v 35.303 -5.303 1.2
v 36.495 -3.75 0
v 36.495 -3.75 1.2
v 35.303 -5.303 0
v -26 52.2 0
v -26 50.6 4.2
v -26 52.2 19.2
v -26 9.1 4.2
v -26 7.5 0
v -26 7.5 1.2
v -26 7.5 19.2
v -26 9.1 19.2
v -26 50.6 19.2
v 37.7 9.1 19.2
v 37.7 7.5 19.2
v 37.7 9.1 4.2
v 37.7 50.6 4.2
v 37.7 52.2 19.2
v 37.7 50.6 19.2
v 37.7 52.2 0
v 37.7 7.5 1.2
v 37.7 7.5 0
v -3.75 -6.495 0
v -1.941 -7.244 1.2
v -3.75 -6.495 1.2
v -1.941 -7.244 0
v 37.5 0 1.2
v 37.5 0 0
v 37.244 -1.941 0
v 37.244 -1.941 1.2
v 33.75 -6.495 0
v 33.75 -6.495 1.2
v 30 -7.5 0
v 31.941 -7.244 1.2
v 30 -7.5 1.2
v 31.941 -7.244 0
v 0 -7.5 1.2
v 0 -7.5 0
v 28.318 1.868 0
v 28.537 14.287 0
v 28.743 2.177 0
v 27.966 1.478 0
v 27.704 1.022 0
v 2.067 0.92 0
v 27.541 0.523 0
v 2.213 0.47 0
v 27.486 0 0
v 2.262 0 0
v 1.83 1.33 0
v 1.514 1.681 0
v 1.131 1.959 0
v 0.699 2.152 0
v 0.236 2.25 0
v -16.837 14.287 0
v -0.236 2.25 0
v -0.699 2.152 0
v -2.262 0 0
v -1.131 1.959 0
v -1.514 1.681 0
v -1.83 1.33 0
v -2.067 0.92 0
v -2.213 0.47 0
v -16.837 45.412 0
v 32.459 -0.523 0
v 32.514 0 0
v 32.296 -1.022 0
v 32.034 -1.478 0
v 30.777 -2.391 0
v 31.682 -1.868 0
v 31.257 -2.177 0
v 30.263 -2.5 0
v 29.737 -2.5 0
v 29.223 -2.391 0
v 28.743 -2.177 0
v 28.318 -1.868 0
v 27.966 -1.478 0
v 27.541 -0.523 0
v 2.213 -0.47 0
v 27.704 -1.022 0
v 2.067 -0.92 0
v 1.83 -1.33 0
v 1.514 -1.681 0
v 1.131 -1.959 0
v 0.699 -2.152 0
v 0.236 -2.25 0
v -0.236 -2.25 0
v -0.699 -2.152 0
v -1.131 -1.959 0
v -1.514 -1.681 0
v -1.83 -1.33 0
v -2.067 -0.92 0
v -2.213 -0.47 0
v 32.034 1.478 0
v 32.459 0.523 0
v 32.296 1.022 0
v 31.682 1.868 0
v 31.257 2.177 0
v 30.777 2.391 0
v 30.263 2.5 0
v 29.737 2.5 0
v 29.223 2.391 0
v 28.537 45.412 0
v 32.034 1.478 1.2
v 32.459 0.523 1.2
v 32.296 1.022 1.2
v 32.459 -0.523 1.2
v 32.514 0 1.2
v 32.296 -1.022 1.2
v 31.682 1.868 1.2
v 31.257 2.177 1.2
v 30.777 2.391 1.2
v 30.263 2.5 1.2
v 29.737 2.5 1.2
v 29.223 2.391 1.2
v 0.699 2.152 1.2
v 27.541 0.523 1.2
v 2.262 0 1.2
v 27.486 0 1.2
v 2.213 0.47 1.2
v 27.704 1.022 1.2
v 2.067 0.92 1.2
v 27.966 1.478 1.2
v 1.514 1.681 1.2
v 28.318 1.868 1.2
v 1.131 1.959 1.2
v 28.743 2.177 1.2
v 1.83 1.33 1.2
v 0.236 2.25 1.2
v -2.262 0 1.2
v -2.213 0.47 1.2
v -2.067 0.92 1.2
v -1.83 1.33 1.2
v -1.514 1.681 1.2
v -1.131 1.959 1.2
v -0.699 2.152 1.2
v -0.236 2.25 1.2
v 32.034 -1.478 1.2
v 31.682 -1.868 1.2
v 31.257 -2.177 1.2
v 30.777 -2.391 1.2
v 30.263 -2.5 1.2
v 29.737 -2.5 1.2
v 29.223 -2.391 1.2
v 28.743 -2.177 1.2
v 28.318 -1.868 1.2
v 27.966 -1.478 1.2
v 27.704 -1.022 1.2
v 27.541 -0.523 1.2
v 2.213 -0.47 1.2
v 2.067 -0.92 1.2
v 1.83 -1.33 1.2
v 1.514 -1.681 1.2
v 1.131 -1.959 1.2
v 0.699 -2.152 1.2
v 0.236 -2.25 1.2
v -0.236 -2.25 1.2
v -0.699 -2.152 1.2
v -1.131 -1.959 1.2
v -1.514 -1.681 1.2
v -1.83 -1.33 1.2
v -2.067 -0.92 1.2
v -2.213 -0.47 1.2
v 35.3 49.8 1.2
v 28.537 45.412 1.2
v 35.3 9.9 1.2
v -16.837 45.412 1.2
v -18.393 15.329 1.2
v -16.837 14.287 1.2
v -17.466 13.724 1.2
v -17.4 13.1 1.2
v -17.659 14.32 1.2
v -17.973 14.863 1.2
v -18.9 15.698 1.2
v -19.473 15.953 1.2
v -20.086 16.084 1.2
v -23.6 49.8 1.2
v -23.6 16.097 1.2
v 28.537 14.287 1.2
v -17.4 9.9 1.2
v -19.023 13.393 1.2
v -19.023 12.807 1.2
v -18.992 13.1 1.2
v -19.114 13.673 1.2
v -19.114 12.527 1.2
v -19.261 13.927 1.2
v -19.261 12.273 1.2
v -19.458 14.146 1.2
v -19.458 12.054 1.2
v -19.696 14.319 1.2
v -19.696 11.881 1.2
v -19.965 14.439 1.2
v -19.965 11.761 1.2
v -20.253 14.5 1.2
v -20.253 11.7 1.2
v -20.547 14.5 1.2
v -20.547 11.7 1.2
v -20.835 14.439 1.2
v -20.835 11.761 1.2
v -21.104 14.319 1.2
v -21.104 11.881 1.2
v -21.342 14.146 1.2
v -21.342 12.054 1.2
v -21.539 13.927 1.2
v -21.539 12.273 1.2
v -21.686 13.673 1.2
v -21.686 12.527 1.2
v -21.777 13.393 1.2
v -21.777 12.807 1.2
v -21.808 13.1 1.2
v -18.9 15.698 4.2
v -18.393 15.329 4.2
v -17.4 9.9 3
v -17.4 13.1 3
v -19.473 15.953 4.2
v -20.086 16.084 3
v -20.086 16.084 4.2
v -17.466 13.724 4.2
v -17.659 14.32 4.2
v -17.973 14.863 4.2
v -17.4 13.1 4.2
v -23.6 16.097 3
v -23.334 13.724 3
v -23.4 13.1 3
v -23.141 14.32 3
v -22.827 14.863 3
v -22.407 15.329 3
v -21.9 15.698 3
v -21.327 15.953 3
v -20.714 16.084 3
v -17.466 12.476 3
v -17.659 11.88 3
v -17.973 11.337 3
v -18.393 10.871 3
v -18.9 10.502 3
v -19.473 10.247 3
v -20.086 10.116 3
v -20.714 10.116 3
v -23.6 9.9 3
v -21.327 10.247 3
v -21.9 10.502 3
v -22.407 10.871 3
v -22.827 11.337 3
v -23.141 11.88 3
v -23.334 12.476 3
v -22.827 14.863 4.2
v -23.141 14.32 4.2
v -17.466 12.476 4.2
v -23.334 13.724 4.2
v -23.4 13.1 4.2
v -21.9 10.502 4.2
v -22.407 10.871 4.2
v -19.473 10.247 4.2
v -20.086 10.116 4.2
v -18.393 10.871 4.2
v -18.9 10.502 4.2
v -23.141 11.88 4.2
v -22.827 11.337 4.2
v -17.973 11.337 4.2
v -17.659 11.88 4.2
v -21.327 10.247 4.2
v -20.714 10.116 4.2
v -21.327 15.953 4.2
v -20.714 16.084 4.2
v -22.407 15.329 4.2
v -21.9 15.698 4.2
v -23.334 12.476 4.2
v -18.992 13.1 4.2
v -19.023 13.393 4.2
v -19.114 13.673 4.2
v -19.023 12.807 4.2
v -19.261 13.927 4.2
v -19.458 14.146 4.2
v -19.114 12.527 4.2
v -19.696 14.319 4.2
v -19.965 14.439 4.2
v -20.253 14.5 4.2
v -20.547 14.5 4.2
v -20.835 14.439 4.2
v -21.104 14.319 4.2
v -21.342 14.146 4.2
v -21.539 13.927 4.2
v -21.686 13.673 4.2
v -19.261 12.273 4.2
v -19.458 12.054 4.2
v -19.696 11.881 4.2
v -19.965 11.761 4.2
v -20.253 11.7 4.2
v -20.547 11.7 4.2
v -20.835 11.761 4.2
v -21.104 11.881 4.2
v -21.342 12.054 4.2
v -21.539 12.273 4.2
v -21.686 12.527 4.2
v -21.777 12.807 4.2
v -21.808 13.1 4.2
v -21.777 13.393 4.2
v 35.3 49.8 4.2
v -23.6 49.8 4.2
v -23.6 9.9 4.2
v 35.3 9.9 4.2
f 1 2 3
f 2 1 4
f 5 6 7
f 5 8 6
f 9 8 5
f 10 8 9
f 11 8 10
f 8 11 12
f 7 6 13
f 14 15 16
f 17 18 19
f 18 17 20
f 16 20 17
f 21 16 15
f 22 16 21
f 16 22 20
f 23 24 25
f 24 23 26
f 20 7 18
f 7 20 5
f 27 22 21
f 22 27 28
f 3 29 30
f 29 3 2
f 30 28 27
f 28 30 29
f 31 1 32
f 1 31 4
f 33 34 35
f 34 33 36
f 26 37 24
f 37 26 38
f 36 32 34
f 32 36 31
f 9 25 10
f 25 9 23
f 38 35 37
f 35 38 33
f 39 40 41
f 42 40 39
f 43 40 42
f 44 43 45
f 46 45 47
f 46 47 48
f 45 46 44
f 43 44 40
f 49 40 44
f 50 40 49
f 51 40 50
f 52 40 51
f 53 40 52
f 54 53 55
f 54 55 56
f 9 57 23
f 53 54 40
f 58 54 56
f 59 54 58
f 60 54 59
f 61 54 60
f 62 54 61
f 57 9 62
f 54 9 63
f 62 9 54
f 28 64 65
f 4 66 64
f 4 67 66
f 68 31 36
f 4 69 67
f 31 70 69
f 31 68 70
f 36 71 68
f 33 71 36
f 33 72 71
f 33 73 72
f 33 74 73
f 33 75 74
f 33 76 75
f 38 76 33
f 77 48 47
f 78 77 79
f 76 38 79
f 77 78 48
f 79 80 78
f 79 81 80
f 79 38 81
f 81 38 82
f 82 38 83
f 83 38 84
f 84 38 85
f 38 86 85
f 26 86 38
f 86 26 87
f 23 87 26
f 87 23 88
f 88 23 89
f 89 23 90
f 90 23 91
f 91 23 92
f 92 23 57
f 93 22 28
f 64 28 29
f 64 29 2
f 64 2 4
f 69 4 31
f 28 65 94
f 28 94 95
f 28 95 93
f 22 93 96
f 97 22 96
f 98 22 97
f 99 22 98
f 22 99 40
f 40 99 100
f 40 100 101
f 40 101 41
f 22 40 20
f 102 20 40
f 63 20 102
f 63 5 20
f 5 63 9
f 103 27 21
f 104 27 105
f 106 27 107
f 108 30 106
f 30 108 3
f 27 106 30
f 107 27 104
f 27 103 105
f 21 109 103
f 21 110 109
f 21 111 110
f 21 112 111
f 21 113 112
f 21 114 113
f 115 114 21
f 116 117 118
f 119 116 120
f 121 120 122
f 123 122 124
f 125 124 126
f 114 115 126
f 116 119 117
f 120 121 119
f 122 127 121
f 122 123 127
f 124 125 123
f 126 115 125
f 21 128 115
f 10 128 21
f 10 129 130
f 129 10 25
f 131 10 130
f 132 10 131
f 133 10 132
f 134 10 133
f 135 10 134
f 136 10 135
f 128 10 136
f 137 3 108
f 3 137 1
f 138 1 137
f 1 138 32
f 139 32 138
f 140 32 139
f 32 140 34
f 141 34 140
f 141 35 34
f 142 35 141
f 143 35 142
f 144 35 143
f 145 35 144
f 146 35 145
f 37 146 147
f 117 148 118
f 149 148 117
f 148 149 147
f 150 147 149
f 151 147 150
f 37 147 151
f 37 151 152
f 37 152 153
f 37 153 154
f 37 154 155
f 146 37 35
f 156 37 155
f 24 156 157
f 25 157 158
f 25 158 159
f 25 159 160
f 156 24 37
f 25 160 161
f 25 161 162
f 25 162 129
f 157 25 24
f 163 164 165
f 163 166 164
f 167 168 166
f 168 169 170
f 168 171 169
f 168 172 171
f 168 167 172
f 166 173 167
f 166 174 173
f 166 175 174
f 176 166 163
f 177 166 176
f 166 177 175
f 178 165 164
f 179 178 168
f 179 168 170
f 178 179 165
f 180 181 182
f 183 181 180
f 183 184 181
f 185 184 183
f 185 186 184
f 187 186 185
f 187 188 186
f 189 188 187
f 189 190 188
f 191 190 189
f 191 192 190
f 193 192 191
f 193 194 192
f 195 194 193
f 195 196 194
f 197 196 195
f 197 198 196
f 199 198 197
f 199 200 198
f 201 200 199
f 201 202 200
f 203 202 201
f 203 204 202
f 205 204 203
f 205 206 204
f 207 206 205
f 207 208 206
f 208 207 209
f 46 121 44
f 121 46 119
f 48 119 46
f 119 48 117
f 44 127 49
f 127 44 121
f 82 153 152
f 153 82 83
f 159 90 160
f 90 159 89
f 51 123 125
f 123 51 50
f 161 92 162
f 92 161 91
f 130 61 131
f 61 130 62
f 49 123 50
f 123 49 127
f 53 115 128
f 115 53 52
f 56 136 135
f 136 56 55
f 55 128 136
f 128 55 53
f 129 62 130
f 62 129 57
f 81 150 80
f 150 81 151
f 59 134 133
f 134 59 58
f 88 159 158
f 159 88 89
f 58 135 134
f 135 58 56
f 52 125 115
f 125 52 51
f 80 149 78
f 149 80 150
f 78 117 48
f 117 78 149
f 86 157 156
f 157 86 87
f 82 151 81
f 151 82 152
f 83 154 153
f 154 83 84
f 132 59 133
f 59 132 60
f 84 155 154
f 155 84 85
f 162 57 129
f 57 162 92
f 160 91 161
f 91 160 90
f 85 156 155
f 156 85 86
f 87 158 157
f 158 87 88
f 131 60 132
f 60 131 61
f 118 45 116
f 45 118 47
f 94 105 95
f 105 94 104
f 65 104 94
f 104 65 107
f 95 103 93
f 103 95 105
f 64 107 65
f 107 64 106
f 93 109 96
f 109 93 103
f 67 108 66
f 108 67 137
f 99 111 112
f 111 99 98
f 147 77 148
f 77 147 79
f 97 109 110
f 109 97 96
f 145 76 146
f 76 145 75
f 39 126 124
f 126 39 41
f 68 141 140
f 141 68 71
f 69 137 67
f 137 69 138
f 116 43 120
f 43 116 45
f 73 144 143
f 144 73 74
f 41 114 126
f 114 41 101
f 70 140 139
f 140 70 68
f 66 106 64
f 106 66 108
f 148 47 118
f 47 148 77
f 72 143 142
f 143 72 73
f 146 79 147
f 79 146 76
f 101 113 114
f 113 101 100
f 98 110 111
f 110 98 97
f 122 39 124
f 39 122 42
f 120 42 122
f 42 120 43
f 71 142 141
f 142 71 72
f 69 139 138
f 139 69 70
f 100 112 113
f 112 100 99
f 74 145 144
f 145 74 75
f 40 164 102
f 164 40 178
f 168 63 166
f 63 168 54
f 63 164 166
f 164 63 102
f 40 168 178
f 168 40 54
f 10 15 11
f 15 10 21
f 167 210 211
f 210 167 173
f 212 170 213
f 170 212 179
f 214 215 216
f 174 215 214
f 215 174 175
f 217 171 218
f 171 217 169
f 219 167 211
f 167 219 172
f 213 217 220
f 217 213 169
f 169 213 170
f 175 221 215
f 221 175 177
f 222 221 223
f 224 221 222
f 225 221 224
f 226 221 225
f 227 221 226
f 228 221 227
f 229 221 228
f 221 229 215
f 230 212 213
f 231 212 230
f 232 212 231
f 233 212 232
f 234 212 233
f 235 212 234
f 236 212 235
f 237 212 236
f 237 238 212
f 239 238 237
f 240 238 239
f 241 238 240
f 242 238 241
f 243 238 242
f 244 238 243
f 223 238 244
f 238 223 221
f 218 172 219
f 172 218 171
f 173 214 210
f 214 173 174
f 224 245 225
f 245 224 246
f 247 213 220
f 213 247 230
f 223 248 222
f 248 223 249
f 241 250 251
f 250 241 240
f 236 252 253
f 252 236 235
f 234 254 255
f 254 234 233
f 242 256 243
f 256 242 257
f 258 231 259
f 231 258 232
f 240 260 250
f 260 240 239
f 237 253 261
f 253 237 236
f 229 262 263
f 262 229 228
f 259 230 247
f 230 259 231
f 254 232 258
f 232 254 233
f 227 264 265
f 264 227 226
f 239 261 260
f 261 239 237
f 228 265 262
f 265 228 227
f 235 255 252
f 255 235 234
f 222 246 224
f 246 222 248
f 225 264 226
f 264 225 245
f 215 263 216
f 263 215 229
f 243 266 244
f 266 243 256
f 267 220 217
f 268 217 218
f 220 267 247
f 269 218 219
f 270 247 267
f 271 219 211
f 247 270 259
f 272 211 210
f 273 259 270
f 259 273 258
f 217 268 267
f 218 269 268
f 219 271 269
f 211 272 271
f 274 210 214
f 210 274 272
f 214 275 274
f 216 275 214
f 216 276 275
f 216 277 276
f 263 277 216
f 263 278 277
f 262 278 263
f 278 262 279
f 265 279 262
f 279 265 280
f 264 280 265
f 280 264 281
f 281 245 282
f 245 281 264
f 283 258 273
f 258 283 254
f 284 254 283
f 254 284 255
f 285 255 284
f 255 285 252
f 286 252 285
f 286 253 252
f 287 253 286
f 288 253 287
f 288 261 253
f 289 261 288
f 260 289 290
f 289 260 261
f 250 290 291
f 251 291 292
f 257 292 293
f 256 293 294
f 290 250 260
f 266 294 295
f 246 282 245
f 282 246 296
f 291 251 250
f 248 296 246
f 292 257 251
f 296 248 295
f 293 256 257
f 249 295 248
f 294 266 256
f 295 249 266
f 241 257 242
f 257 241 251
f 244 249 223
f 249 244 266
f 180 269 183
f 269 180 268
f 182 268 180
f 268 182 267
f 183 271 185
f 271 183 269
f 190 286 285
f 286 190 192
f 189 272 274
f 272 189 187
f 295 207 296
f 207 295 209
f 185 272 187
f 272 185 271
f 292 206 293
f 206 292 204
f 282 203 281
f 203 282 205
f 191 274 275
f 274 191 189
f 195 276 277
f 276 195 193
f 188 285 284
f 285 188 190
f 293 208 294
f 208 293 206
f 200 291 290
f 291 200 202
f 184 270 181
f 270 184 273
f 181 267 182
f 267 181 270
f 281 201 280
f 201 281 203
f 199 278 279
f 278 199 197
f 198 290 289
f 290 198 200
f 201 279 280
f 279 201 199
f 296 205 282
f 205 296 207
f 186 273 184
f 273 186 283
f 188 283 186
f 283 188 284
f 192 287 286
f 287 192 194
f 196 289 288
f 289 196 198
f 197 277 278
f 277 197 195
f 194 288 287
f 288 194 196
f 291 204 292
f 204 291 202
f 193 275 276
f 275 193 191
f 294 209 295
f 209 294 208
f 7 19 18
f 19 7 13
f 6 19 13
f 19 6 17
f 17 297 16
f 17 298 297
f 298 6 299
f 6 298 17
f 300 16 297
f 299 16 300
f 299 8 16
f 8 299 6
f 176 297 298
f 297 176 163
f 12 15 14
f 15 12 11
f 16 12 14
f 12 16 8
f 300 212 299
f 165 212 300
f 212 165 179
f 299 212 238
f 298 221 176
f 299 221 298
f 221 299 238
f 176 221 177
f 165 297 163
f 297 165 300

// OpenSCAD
// Common
base_thickness = 1.2;

// Hole 1 (Always created)
hole_1_diameter = 4.5;
hole_1_support_diameter = 15;

// Hole 2 (Created if offsets != 0)
hole_2_diameter = 5;
hole_2_support_diameter = 15;
hole_2_offset_x = 30;
hole_2_offset_y = 0;

// Hole 3 (Created if offsets != 0)
hole_3_diameter = 5;
hole_3_support_diameter = 15;
hole_3_offset_x = 0;
hole_3_offset_y = 0;

// Hole 4 (Created if offsets != 0)
hole_4_diameter = 5;
hole_4_support_diameter = 15;
hole_4_offset_x = 0;
hole_4_offset_y = 0;

// Chip parameters
chip_offset_x = -26;
chip_offset_y = 7.5;
chip_rotation = 0;  // [0:0, 90:90, 180:180, 270:270]
wall_thickness = 1.6;
chip_length = 60.5;
chip_width = 41.5;
chip_height = 18;
riser_height = 3;
riser_width = 0.8;
mount_top = 1;  // [0:No, 1:Yes]
mount_bottom = 1;  // [0:No, 1:Yes]
mount_left = 0;  // [0:No, 1:Yes]
mount_right = 0;  // [0:No, 1:Yes]
riser_top = 1;  // [0:No, 1:Yes]
riser_bottom = 1;  // [0:No, 1:Yes]
riser_left = 1;  // [0:No, 1:Yes]
riser_right = 1;  // [0:No, 1:Yes]
lighten_mount = 1;  // [0:No, 1:Yes]
dual_mount = 0;  // [0:No, 1:Yes]
bottom_left_hole = 1;  // [0:No, 1:Yes]
bl_hole_x = 4;
bl_hole_y = 4;
bl_hole_diameter = 2.8;
bl_hole_thickness = 1.6;


module hole(radius, thickness){
  fn = 30;
  fudge = 1 / cos(180 / fn);
  translate([0, 0, -thickness*0.01]) {
    cylinder(h=thickness * 1.02, r=radius * fudge, $fn=fn);
  }
}


module chip_mount(length, width, height, base_thickness, wall_thickness,
                  riser_width, riser_height,
                  mount_top, riser_top, mount_bottom, riser_bottom,
                  mount_left, riser_left, mount_right, riser_right, lighten,
                  bottom_left_hole, bl_hole_x, bl_hole_y, bl_hole_diameter,
                  bl_hole_thickness) {
  // Mount base
  difference() {
    cube([length + 2 * wall_thickness,
          width + 2 * wall_thickness,
          base_thickness]);
    if (lighten) {
      translate([wall_thickness + length * 0.125,
                 wall_thickness + width * 0.125,
                 -base_thickness * 0.1]) {
        cube([length * 0.75, width * 0.75, base_thickness * 1.2]);
      }
    }
  }
  // Mount top
  if (mount_top) {
    translate([0, wall_thickness + width, base_thickness]) {
      cube([length + 2 * wall_thickness, wall_thickness, height]);
    }
  }
  // Riser top
  if (riser_top) {
    translate([0, wall_thickness + width - riser_width, base_thickness]) {
      cube([length + 2 * wall_thickness,
            wall_thickness + riser_width,
            riser_height]);
    }
  }
  // Mount bottom
  if (mount_bottom) {
    cube([length + 2 * wall_thickness, wall_thickness, base_thickness + height]);
  }
  // Riser bottom
  if (riser_bottom) {
    cube([length + 2 * wall_thickness,
          wall_thickness + riser_width,
          base_thickness + riser_height]);
  }
  // Mount left
  if (mount_left) {
    cube([wall_thickness,
          width + 2 * wall_thickness,
          base_thickness + height]);
  }
  // Riser left
  if (riser_left) {
    cube([wall_thickness + riser_width,
          width + 2 * wall_thickness,
          base_thickness + riser_height]);
  }
  // Mount right
  if (mount_right) {
    translate([wall_thickness + length, 0, 0]) {
      cube([wall_thickness, width + 2 * wall_thickness, base_thickness + height]);
    }
  }
  // Riser right
  if (riser_right) {
    translate([wall_thickness + length - riser_width, 0, 0]) {
      cube([wall_thickness + riser_width,
            width + 2 * wall_thickness,
            base_thickness + riser_height]);
    }
  }
  // Bottom left hole
  if (bottom_left_hole) {
    bl_inner_radius = bl_hole_diameter * 0.5;
    bl_outer_radius = bl_inner_radius + bl_hole_thickness;
    support_height =
        (bl_hole_x < 6 && bl_hole_y < 6) ? riser_height : base_thickness;
    difference() {
      union() {
        hull() {
          cube([wall_thickness + bl_hole_x + bl_outer_radius,
                wall_thickness,
                support_height]);
          cube([wall_thickness,
                wall_thickness + bl_hole_y + bl_outer_radius,
                support_height]);
          translate([wall_thickness + bl_hole_x,
                     wall_thickness + bl_hole_y,
                     0]) {
            cylinder(r=bl_outer_radius, h=support_height, $fn=30);
          }
        }
        translate([wall_thickness + bl_hole_x, wall_thickness + bl_hole_y, 0]) {
          cylinder(r=bl_outer_radius, h=riser_height + base_thickness, $fn=30);
        }
      }
      translate([wall_thickness + bl_hole_x, wall_thickness + bl_hole_y, 0]) {
        hole(bl_inner_radius, riser_height + base_thickness);
      }
    }
    // Fill in the bottom of the hole
    translate([wall_thickness + bl_hole_x, wall_thickness + bl_hole_y, 0]) {
      cylinder(r=bl_outer_radius, h=base_thickness, $fn=30);
    }
  }
}


hole_2 = (hole_2_offset_x != 0) || (hole_2_offset_y != 0);
echo("hole_2",hole_2);
hole_3 = (hole_3_offset_x != 0) || (hole_3_offset_y != 0);
echo("hole_3",hole_3);
hole_4 = (hole_4_offset_x != 0) || (hole_4_offset_y != 0);
echo("hole_4",hole_4);
mount_width =
  2.0 * wall_thickness + ((chip_rotation % 180) ? chip_width : chip_length);
echo("mount_width",mount_width);
mount_height =
  2.0 * wall_thickness + ((chip_rotation % 180) ? chip_length : chip_width);
echo("mount_height",mount_height);
mod_offset_x = chip_offset_x +
  ((chip_rotation == 90 || chip_rotation == 180) ? mount_width : 0.0);
echo("mod_offset_x", mod_offset_x);
mod_offset_y = chip_offset_y + ((chip_rotation >= 180) ? mount_height : 0);
echo("mod_offset_y", mod_offset_y);


difference() {
  // Main mount
  hull() {
    // Mount-1
    cylinder(h=base_thickness, d=hole_1_support_diameter);
    // Mount-2
    if (hole_2) {
      translate([hole_2_offset_x, hole_2_offset_y, 0]) {
        cylinder(h=base_thickness, d=hole_2_support_diameter);
      }
    }
    // Mount-3
    if (hole_3) {
      translate([hole_3_offset_x, hole_3_offset_y, 0]) {
        cylinder(h=base_thickness, d=hole_3_support_diameter);
      }
    }
    // Mount-4
    if (hole_4) {
      translate([hole_4_offset_x, hole_4_offset_y, 0]) {
        cylinder(h=base_thickness, d=hole_4_support_diameter);
      }
    }
    // Mount offset
    translate([chip_offset_x, chip_offset_y, 0]) {
      cube([mount_width, mount_height, base_thickness]);
    }
  }  // End hull
  // Hole-1
  hole(hole_1_diameter * 0.5, base_thickness, $fn);
  // Hole-2
  if (hole_2) {
    translate([hole_2_offset_x, hole_2_offset_y, 0]) {
      hole(hole_2_diameter * 0.5, base_thickness, $fn);
    }
  }
  // Hole-3
  if (hole_3) {
    translate([hole_3_offset_x, hole_3_offset_y, 0]) {
      hole(hole_3_diameter * 0.5, base_thickness, $fn);
    }
  }
  // Hole-4
  if (hole_4) {
    translate([hole_4_offset_x, hole_4_offset_y, 0]) {
      hole(hole_4_diameter * 0.5, base_thickness, $fn);
    }
  }
  if (lighten_mount) {
    translate([chip_offset_x + wall_thickness + (mount_width - 2 * wall_thickness) * 0.125,
               chip_offset_y + wall_thickness + (mount_height - 2 * wall_thickness) * 0.125,
               -base_thickness * 0.1]) {
      cube([(mount_width - 2 * wall_thickness) * 0.75,
            (mount_height - 2 * wall_thickness) * 0.75,
            base_thickness * 1.2]);
    }
  }
}  // End base plate

translate([mod_offset_x, mod_offset_y, 0]) {
  rotate([0, 0, chip_rotation])
    chip_mount(chip_length, chip_width, chip_height, base_thickness,
               wall_thickness, riser_width, riser_height,
               mount_top, riser_top, mount_bottom, riser_bottom,
               mount_left, riser_left, mount_right, riser_right, lighten_mount,
               bottom_left_hole, bl_hole_x, bl_hole_y, bl_hole_diameter,
               bl_hole_thickness);
}
